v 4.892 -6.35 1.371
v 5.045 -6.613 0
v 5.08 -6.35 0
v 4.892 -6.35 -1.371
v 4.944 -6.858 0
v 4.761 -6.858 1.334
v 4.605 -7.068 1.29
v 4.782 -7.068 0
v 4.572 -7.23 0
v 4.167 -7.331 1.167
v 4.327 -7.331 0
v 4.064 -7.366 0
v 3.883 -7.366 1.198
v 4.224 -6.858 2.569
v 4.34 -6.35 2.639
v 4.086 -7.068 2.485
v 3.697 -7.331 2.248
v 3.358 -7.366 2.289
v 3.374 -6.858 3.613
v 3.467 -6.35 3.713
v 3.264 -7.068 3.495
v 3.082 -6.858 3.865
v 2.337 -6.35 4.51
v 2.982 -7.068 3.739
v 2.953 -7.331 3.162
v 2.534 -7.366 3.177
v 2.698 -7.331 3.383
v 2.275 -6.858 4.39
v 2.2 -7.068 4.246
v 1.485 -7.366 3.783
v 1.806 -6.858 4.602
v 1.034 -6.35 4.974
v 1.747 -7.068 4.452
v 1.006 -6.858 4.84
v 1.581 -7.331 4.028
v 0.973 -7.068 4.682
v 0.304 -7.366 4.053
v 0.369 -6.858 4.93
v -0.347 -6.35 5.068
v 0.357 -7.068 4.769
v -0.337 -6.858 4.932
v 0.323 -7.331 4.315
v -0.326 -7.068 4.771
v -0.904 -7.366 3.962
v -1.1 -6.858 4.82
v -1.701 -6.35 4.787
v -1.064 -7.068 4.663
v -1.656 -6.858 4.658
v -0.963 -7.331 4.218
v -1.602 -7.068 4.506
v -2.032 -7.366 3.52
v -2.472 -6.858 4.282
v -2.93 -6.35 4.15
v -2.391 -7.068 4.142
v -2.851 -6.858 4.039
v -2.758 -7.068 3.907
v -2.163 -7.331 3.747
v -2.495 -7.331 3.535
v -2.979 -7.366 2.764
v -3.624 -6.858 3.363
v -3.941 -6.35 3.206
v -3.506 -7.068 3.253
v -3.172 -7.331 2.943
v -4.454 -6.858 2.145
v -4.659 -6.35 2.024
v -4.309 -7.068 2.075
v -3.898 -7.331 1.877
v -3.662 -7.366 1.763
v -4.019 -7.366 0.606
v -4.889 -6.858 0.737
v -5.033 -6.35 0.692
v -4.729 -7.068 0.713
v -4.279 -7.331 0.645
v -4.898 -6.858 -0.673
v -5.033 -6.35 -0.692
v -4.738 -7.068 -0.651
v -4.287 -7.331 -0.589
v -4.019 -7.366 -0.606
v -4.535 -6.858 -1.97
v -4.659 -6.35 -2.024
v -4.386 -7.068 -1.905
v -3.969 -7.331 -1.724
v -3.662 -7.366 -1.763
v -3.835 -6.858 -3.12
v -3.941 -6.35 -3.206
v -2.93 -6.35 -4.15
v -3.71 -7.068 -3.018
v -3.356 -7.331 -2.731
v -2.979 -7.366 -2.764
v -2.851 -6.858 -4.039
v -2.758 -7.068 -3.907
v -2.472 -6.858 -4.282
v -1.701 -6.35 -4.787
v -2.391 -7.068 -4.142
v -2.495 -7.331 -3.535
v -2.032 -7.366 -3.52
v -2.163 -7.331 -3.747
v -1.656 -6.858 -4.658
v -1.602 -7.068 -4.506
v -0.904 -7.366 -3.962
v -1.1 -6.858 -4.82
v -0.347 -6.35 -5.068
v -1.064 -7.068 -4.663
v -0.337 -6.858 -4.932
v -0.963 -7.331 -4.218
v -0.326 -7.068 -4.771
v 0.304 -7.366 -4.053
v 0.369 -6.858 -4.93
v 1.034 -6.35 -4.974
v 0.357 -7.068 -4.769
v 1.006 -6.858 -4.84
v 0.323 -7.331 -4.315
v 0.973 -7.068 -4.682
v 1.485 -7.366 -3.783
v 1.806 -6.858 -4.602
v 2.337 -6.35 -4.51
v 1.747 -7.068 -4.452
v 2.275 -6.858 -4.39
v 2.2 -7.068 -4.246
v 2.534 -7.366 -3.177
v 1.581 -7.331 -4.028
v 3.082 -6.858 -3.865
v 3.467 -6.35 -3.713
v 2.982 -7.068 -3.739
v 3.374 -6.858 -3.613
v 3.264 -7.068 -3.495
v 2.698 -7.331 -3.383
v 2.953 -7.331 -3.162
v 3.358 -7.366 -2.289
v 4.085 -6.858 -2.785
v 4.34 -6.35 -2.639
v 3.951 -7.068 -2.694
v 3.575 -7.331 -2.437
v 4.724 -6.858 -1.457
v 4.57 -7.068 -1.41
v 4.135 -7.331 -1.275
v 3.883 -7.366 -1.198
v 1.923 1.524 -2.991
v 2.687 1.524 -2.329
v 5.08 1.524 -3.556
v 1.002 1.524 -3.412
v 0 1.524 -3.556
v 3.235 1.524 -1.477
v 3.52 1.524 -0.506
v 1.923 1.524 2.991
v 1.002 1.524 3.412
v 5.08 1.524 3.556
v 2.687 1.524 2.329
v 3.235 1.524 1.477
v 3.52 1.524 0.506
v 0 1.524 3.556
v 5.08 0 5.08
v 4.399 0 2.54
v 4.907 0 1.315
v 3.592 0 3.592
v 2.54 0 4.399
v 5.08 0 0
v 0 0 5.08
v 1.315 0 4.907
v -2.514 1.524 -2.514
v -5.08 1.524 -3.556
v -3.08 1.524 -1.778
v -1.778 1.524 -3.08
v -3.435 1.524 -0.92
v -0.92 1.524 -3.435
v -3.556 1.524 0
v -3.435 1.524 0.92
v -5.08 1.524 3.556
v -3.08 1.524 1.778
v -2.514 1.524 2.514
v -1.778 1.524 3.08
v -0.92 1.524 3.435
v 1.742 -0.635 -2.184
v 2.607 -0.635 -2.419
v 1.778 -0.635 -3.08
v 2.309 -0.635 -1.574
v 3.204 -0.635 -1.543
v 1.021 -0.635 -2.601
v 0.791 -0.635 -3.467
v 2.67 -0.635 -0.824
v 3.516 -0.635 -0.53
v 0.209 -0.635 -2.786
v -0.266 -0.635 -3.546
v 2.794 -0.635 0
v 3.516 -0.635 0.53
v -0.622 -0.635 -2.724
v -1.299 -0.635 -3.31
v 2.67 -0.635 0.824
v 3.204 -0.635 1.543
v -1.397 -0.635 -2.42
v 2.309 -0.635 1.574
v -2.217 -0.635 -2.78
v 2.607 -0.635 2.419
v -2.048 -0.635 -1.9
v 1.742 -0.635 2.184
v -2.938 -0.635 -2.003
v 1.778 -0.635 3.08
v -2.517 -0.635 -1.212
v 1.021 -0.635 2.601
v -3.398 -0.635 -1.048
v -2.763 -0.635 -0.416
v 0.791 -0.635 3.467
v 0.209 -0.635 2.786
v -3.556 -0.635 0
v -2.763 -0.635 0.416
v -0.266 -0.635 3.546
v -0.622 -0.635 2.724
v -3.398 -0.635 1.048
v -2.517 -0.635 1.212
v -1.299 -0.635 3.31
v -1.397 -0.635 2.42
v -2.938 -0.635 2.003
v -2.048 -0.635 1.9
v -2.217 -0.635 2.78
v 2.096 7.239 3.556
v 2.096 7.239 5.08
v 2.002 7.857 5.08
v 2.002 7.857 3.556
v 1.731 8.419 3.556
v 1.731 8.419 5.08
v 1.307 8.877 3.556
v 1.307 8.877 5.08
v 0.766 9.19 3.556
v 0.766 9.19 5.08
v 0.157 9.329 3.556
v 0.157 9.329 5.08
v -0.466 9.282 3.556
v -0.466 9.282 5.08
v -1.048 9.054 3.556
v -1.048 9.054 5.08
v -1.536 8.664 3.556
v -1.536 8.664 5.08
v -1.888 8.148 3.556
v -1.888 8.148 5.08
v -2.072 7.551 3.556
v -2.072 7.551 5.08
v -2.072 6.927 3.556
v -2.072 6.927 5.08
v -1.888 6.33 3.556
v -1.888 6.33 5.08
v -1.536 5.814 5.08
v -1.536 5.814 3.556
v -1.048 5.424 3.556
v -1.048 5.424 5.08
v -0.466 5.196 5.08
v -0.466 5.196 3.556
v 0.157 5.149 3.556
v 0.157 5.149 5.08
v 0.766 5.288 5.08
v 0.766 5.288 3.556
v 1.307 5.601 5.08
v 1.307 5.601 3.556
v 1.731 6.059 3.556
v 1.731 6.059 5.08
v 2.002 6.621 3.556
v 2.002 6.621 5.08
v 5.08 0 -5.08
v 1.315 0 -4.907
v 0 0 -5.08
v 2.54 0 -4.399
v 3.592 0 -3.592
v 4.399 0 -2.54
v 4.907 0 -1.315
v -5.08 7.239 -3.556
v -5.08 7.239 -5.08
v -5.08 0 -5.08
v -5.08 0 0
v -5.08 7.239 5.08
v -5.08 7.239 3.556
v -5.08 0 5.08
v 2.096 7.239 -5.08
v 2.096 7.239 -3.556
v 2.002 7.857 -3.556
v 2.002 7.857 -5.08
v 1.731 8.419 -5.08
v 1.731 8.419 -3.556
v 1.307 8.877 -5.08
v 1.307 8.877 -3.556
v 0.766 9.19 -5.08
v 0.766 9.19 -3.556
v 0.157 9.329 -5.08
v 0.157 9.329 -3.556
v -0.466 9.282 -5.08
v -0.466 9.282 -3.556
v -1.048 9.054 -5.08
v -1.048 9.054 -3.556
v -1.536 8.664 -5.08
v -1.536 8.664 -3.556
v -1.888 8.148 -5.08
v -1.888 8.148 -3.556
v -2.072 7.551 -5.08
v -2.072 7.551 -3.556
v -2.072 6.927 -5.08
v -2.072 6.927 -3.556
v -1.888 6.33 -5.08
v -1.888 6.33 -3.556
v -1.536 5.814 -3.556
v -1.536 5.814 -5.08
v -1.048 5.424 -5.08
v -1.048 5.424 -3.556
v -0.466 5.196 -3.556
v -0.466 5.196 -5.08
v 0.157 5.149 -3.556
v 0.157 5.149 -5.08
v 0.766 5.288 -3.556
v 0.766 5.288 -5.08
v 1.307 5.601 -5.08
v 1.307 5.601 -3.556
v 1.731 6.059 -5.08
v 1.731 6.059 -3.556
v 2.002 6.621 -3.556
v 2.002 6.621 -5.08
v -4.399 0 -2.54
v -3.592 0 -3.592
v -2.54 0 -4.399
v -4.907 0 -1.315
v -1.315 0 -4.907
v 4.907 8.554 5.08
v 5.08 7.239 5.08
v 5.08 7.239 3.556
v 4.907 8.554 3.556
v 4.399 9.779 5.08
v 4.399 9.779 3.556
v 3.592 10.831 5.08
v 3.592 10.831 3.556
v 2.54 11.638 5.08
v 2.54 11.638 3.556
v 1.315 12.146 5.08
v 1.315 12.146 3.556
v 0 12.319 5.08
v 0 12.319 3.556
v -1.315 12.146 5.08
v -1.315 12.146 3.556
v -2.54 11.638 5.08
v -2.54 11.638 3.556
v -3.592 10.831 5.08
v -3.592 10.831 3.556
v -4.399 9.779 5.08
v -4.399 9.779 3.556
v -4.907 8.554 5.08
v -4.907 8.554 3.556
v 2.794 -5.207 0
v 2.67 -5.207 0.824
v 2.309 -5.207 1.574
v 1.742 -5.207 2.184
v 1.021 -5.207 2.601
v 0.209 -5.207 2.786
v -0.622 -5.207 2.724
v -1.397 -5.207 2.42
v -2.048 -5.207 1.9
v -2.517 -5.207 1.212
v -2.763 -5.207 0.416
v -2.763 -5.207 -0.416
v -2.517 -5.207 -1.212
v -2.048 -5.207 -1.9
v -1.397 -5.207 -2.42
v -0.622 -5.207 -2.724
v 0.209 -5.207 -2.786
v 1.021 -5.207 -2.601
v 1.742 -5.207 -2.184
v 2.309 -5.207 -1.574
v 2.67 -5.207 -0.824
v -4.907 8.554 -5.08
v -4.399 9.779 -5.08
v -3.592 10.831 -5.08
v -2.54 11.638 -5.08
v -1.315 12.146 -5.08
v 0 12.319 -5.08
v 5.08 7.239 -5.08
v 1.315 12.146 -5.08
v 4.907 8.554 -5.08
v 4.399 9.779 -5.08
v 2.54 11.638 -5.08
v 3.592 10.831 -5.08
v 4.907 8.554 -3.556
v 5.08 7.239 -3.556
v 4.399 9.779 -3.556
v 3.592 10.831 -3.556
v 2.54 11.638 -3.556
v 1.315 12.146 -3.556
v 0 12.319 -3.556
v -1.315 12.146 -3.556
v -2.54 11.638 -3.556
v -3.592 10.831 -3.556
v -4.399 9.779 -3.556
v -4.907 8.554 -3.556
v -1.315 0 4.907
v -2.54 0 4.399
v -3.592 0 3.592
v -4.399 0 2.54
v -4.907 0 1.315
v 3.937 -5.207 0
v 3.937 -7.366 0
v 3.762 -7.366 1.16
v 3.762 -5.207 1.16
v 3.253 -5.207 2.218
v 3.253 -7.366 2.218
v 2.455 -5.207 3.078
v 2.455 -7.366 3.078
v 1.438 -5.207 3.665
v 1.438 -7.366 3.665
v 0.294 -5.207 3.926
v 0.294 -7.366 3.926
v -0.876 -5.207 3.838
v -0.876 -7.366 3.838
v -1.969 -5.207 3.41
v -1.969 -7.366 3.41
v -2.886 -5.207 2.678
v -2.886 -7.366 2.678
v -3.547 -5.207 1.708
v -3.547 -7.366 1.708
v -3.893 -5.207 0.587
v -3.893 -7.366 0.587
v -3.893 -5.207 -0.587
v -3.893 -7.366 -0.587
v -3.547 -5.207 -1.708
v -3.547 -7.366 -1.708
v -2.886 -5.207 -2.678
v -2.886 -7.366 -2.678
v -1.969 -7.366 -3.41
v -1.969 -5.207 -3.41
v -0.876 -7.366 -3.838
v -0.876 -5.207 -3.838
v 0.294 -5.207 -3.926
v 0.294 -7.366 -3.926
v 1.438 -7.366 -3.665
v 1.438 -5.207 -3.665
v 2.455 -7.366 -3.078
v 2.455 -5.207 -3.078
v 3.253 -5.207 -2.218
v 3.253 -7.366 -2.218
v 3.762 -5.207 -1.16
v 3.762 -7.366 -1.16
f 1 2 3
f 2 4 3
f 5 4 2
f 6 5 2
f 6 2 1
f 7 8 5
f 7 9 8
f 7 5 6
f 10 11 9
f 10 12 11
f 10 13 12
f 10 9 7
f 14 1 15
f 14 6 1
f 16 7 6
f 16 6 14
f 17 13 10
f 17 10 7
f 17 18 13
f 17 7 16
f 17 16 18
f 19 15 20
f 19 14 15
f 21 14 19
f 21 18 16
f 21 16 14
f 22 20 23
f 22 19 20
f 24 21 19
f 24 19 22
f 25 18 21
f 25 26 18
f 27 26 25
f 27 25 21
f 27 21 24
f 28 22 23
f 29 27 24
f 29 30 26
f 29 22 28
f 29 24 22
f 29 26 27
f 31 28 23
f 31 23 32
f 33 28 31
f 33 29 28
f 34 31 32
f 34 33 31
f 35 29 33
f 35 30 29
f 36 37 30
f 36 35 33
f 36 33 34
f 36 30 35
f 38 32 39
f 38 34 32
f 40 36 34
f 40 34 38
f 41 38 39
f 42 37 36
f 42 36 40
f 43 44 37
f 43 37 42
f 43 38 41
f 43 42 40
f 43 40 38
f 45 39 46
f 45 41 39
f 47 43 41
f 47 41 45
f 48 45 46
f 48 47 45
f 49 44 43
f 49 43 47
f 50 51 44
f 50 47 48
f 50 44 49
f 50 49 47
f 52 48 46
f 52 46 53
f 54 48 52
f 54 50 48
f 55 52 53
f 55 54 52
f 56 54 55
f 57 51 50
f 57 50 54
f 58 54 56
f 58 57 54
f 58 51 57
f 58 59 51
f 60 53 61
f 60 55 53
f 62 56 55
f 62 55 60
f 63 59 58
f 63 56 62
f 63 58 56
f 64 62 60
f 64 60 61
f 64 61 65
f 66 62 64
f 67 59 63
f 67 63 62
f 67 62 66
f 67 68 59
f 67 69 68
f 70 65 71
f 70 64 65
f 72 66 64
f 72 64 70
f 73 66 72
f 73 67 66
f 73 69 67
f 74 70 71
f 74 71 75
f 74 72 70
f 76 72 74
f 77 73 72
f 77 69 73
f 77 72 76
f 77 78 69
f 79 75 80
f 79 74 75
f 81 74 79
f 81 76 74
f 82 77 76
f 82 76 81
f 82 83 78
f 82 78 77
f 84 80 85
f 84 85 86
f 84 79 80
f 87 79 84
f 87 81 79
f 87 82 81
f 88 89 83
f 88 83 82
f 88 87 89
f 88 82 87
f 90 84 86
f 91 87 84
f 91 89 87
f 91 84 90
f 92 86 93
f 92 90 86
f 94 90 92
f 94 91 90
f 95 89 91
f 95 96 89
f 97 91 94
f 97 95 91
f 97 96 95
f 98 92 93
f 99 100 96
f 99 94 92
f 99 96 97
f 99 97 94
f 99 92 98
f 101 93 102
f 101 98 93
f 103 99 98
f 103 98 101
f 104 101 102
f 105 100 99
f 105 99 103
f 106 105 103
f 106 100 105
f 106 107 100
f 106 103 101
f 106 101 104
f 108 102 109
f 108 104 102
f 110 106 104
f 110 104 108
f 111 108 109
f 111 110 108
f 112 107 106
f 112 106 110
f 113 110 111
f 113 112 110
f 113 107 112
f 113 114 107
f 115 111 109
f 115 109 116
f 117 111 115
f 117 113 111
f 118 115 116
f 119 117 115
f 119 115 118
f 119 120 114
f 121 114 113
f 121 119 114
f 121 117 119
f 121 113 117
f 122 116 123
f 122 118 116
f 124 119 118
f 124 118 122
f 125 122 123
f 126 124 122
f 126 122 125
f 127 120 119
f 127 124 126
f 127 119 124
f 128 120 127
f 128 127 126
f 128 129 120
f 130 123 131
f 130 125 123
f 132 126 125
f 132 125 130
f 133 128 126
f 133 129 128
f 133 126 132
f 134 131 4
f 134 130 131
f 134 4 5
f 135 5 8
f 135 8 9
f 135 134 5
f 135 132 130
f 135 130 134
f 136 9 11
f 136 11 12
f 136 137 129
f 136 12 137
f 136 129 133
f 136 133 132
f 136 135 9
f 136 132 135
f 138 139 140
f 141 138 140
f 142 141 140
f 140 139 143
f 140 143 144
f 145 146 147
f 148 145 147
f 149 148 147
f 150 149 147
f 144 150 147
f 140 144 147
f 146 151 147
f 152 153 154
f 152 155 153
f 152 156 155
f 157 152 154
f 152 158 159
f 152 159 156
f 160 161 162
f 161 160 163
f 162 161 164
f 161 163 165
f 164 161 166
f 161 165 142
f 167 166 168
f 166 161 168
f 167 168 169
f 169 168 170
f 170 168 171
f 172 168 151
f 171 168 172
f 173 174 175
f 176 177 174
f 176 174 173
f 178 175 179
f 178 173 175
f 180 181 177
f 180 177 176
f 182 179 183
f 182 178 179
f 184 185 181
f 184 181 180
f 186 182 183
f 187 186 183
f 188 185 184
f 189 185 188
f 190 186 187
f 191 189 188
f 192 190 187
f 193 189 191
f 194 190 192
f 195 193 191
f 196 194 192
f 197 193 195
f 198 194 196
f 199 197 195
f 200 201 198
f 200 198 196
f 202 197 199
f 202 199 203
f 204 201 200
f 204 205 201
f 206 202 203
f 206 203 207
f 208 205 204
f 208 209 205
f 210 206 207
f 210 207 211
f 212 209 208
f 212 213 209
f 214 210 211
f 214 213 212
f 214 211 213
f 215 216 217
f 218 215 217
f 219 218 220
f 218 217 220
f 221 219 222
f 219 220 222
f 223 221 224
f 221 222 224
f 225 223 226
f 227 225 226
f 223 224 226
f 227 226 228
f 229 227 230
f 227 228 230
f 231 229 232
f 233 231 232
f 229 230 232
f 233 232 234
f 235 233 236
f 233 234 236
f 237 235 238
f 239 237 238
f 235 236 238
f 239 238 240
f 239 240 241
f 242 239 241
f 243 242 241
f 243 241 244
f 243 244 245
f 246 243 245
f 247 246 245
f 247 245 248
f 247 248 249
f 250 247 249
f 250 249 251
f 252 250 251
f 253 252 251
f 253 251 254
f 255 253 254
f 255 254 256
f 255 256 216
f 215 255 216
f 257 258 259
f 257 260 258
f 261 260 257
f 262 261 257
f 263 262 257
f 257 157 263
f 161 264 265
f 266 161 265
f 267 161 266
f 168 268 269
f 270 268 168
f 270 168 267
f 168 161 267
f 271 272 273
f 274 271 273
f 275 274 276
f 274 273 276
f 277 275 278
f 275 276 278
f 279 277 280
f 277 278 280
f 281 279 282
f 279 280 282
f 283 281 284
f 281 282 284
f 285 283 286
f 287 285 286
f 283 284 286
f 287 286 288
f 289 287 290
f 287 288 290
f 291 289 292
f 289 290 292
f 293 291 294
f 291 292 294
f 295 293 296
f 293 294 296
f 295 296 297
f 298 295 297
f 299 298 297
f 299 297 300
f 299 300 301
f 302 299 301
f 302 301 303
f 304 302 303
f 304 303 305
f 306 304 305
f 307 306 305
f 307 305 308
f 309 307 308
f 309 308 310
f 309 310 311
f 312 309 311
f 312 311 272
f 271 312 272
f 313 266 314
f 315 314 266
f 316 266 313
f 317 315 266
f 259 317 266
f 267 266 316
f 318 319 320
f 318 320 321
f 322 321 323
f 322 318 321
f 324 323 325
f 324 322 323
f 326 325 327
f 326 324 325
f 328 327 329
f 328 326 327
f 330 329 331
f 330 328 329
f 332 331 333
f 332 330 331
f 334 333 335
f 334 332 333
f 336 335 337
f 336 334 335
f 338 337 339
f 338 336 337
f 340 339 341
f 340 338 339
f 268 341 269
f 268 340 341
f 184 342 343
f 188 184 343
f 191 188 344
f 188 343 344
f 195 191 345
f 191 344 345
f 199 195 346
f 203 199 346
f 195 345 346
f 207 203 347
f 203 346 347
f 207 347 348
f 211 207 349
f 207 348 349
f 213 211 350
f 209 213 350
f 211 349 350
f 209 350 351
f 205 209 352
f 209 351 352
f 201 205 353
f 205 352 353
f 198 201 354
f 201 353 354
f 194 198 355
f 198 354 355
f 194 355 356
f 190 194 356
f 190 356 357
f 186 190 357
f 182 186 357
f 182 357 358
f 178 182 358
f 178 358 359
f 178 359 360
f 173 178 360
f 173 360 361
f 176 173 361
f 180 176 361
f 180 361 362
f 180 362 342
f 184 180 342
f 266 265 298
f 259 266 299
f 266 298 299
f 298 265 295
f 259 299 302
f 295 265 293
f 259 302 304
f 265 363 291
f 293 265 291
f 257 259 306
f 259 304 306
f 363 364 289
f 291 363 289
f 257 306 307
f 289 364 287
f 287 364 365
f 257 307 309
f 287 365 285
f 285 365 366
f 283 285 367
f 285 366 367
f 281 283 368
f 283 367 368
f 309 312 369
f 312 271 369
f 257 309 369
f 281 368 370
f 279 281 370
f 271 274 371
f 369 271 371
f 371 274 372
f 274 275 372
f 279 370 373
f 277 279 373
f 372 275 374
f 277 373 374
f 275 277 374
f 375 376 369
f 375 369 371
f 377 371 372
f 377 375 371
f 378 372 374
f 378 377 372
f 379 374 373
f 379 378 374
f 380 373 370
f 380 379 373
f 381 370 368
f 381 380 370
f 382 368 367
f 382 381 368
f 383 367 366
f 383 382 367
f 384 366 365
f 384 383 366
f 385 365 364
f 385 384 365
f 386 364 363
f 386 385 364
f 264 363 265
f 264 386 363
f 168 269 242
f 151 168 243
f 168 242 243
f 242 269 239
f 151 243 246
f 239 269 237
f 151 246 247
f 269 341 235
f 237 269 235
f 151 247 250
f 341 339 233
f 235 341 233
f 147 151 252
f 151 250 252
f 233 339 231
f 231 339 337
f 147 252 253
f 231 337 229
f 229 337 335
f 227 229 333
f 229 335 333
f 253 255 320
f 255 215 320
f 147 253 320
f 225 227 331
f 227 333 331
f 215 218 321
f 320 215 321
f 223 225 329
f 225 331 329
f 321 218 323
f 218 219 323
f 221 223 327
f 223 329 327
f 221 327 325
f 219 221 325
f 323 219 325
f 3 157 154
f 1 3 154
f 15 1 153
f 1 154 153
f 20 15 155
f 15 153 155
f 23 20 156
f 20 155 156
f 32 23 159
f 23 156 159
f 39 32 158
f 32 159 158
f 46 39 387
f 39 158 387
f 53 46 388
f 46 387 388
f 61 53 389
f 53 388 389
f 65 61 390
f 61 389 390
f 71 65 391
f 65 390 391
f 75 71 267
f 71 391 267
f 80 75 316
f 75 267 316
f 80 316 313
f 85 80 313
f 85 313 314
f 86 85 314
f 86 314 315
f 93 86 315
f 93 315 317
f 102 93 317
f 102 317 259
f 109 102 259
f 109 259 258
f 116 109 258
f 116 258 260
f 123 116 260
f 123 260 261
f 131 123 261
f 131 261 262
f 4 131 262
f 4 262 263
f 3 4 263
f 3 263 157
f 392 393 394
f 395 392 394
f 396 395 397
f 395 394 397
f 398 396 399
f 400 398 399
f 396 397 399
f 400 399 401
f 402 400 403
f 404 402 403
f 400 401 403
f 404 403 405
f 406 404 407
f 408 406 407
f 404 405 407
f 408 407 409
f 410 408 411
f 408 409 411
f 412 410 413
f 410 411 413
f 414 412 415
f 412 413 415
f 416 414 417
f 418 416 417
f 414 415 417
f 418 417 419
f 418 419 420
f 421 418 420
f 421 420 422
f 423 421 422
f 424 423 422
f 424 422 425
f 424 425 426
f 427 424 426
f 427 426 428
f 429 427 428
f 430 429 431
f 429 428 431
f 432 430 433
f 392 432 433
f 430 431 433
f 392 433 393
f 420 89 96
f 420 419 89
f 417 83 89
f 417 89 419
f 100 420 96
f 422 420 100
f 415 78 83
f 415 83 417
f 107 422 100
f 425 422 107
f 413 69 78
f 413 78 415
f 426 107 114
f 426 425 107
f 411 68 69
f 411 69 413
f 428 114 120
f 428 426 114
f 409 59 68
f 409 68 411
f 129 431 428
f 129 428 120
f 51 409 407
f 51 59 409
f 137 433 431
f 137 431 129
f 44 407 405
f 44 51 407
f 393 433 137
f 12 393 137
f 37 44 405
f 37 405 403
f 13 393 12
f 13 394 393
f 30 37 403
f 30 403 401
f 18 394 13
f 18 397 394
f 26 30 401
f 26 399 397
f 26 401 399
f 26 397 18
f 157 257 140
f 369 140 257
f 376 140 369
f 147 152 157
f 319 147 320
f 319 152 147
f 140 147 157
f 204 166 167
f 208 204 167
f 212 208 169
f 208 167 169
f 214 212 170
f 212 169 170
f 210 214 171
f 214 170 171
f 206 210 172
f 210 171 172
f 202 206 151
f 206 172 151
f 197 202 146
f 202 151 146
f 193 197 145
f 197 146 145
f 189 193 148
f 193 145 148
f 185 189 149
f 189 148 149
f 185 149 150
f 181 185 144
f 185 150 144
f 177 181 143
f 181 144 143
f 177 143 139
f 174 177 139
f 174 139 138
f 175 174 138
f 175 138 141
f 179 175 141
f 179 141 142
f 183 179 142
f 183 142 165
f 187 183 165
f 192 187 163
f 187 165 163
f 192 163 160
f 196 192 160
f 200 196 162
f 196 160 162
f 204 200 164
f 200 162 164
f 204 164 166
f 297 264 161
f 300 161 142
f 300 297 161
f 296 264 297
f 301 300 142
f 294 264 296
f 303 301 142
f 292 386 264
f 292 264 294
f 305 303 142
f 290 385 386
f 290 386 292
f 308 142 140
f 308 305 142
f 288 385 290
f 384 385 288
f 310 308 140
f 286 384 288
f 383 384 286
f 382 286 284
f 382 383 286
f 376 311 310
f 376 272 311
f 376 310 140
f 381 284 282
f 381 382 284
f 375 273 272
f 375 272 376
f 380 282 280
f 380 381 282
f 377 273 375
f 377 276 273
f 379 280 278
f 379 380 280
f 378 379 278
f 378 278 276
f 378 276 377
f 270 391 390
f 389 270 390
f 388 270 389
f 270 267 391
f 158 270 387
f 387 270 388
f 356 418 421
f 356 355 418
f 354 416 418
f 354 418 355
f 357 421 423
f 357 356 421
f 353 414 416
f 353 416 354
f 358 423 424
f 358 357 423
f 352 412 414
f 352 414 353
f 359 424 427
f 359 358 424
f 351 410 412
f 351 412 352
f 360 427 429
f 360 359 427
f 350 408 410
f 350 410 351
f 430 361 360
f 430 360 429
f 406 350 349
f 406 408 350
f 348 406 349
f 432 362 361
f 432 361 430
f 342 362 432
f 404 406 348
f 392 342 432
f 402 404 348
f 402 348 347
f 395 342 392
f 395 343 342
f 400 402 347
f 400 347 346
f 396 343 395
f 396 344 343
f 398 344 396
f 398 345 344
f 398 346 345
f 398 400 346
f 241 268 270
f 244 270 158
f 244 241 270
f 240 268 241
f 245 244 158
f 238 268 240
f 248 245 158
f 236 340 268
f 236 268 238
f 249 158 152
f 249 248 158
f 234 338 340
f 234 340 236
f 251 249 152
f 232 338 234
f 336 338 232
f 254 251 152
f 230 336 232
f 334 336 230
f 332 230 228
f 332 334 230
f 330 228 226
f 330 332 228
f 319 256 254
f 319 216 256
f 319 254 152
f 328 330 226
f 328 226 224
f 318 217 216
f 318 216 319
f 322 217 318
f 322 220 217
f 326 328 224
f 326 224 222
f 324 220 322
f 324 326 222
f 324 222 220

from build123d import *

# Parameters (mm, degrees)
BASE_EXTRUDE_DEPTH  = 5.08
SHELL1_T            = -1.524
SKETCH2_R           = 2.0955
CUT_EXTRUDE1_DEPTH  = 17.756782537
SKETCH4_R           = 5.08
BOSS_EXTRUDE1_DEPTH = 7.366
SKETCH5_R           = 2.794
CUT_EXTRUDE2_DEPTH  = 21.955
SKETCH3_R           = 3.556
CUT_EXTRUDE3_DEPTH  = 2.159
SKETCH6_R           = 3.937
CUT_EXTRUDE4_DEPTH  = 2.159
FILLET1_R           = 1.016


with BuildPart() as part:
    # Sketch1 → Base-Extrude (new, symmetric)
    with BuildSketch(Plane.XY):
        with BuildLine():
            Line((-5.08, 0), (5.08, 0))
            Line((5.08, 0), (5.08, 7.239))
            ThreePointArc((5.08, 7.239), (0, 12.319), (-5.08, 7.239))
            Line((-5.08, 7.239), (-5.08, 0))
        make_face()
    extrude(amount=BASE_EXTRUDE_DEPTH, both=True)

    # Shell1
    shell1_openings = [part.faces().sort_by_distance(p)[0] for p in [
        (5.08, 3.6195, 0),
        (0, 12.319, 0),
        (-5.08, 3.6195, 0),
    ]]
    offset(amount=SHELL1_T, openings=shell1_openings, kind=Kind.INTERSECTION)

    # Sketch2 → Cut-Extrude1 (cut, through all)
    with BuildSketch(Plane.XY.offset(5.08)):
        with Locations((0, 7.239)):
            Circle(SKETCH2_R)
    extrude(amount=-CUT_EXTRUDE1_DEPTH, mode=Mode.SUBTRACT)

    # Sketch4 → Boss-Extrude1 (add)
    with BuildSketch(Plane.XZ):
        Circle(SKETCH4_R)
    extrude(amount=BOSS_EXTRUDE1_DEPTH)

    # Sketch5 → Cut-Extrude2 (cut, through all)
    with BuildSketch(Plane.XZ.offset(7.366)):
        Circle(SKETCH5_R)
    extrude(amount=-CUT_EXTRUDE2_DEPTH, mode=Mode.SUBTRACT)

    # Sketch3 → Cut-Extrude3 (cut)
    with BuildSketch(Plane(origin=(0, 1.524, 0), x_dir=(-1, 0, 0), z_dir=(0, 1, 0))):
        Circle(SKETCH3_R)
    extrude(amount=-CUT_EXTRUDE3_DEPTH, mode=Mode.SUBTRACT)

    # Sketch6 → Cut-Extrude4 (cut)
    with BuildSketch(Plane.XZ.offset(7.366)):
        Circle(SKETCH6_R)
    extrude(amount=-CUT_EXTRUDE4_DEPTH, mode=Mode.SUBTRACT)

    # Fillet1
    fillet1_edges = [part.edges().sort_by_distance(p)[0] for p in [
        (-5.08, -7.366, 0),
    ]]
    fillet(fillet1_edges, radius=FILLET1_R)


solid = part.part
